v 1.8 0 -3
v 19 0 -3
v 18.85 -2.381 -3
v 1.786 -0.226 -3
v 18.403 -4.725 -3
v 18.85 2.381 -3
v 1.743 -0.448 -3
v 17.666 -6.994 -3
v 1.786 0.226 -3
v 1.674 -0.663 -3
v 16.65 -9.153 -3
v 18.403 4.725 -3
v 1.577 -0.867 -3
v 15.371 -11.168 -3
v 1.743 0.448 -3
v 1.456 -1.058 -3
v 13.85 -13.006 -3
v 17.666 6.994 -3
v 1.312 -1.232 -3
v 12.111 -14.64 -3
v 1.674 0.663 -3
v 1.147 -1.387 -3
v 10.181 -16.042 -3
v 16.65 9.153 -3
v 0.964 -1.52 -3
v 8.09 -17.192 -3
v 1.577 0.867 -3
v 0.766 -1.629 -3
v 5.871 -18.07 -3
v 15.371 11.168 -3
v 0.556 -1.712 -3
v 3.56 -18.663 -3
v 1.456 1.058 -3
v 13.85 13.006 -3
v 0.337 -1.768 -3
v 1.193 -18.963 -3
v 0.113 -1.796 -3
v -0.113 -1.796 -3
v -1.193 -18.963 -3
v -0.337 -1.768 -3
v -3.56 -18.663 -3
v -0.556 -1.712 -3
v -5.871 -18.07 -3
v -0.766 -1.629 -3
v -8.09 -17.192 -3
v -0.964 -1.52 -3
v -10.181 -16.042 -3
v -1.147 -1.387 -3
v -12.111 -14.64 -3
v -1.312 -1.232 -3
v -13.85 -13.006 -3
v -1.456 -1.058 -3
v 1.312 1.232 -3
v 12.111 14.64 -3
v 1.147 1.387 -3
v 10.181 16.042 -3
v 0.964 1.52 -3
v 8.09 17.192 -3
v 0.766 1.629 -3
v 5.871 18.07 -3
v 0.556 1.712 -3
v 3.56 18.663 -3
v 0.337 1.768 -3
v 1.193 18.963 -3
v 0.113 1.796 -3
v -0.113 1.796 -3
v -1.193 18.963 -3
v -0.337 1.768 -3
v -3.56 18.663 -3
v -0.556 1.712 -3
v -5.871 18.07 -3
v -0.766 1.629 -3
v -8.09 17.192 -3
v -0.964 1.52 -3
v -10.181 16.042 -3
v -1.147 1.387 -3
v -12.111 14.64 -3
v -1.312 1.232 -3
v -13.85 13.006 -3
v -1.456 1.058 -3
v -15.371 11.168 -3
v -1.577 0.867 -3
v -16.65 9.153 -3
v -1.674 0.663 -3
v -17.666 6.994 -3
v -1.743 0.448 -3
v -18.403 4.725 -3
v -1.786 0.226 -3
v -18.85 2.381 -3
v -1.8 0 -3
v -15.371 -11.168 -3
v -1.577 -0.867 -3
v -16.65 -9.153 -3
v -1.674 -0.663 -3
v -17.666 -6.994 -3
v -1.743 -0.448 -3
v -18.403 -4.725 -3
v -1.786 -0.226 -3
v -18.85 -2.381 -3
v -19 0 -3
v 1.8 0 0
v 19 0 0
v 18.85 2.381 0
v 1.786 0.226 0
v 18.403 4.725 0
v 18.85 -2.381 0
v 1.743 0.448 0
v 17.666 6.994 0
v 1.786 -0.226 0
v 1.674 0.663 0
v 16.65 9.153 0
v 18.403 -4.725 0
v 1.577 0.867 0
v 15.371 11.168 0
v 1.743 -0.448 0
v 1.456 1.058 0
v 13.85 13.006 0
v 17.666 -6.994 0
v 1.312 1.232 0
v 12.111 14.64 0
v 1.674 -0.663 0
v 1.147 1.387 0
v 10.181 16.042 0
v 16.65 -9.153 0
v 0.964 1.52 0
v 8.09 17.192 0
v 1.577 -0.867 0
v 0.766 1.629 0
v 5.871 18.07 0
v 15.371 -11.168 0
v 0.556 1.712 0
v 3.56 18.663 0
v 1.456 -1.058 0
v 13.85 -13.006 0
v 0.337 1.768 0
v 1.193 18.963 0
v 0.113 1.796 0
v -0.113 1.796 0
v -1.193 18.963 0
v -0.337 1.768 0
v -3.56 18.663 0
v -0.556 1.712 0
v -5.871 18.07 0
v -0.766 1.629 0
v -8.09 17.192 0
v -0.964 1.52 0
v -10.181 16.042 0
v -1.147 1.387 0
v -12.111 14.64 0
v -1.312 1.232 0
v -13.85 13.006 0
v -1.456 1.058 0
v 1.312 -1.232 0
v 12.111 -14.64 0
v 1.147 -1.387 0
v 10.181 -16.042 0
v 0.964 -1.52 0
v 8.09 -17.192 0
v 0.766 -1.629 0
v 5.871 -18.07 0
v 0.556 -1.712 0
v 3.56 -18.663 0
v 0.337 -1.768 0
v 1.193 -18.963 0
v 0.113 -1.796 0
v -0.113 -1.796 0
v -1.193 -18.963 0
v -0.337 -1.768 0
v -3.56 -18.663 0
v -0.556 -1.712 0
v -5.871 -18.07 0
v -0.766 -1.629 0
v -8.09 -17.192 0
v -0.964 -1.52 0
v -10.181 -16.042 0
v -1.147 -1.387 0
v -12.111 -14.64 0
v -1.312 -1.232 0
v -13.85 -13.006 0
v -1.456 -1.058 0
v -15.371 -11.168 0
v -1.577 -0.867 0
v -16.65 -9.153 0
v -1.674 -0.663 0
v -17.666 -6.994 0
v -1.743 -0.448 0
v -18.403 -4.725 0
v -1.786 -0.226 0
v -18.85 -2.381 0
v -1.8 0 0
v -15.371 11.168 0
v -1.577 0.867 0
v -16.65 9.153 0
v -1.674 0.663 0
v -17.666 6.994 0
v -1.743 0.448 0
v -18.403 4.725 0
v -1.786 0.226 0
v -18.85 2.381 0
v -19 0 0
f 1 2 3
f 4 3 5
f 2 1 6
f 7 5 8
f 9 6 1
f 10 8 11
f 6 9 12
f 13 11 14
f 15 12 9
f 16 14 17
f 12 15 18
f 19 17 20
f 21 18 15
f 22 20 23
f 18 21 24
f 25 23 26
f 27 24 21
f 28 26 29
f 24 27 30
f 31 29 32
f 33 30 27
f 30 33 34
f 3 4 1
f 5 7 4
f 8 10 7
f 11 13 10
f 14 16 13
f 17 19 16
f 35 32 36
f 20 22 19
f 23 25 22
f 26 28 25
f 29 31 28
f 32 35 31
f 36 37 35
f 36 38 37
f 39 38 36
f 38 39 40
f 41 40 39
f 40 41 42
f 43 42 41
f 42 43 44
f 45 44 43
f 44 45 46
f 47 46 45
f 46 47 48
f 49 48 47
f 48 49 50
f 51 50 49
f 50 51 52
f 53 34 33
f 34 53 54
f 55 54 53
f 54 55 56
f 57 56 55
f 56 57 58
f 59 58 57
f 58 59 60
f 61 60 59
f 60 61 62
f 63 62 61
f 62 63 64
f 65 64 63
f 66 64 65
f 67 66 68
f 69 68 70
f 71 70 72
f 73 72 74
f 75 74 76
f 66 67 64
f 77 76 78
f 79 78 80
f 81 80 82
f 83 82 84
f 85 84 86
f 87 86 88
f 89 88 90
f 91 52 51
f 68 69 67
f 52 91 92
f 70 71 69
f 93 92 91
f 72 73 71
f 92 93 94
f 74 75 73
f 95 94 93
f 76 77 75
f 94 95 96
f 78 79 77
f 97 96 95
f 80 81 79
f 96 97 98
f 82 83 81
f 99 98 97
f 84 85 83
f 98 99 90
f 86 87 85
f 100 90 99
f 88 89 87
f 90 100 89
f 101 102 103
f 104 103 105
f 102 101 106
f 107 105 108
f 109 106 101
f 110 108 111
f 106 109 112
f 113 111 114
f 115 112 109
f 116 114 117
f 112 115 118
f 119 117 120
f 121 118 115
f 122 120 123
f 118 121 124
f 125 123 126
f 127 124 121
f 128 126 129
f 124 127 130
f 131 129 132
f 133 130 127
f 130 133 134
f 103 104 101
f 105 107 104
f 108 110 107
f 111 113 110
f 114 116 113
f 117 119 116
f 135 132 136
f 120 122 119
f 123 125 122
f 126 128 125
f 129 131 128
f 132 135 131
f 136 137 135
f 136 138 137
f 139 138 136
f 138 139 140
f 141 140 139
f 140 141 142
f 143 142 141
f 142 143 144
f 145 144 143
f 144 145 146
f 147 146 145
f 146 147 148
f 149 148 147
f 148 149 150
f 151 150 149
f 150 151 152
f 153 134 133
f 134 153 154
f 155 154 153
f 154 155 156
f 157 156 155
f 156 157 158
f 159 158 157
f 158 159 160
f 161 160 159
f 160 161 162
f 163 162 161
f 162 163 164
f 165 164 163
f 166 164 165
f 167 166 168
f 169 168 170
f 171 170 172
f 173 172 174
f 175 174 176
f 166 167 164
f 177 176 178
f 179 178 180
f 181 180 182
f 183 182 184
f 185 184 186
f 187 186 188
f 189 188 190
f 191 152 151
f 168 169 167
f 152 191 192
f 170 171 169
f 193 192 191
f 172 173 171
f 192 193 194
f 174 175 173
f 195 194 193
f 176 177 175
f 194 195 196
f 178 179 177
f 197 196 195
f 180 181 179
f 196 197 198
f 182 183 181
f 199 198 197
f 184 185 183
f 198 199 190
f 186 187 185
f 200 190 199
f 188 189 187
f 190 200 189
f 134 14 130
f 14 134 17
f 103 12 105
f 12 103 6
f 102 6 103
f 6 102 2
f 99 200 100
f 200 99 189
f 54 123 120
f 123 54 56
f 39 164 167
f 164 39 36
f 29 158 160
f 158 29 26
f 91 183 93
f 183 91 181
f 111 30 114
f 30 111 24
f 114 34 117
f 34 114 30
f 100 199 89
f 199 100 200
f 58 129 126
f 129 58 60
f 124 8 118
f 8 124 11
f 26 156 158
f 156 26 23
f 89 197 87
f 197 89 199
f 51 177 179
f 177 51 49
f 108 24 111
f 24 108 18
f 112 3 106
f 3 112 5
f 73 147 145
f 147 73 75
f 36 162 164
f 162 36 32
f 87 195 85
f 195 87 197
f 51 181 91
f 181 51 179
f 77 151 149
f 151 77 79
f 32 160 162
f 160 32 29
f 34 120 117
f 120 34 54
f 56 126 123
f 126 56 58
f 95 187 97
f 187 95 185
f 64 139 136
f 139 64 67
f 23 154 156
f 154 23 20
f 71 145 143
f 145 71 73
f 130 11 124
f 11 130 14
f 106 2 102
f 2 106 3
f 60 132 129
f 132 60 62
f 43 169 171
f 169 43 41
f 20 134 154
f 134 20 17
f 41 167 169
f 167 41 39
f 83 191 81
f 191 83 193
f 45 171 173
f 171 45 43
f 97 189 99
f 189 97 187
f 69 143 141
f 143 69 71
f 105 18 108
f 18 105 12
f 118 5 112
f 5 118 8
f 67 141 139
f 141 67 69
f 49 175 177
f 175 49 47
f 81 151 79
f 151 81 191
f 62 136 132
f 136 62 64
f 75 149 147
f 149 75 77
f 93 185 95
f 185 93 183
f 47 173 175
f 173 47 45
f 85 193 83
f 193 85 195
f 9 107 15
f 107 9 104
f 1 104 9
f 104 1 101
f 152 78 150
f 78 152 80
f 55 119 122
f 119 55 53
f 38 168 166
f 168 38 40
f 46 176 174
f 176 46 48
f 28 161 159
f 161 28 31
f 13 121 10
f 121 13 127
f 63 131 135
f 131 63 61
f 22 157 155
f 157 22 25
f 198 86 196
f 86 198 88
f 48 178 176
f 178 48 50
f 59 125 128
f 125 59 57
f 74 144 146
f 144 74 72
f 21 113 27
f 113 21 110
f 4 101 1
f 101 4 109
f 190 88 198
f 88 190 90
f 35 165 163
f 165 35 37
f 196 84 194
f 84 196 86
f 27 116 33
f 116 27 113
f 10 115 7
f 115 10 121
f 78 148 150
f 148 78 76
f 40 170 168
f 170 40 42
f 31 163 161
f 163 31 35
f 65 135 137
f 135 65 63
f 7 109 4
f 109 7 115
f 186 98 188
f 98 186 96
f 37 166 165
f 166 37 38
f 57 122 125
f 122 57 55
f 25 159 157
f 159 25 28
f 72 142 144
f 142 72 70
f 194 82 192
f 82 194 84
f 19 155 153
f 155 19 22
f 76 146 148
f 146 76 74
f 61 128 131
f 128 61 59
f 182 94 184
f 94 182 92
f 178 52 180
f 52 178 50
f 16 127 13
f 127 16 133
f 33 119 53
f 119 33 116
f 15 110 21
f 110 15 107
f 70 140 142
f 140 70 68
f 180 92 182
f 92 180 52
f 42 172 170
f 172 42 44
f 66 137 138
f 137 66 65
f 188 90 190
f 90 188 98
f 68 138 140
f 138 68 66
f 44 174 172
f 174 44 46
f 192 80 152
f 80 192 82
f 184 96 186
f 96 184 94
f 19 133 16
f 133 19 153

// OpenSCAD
$fn = 50;


difference() {
	union() {
		translate(v = [0, 0, -3.0000000000]) {
			cylinder(h = 3, r = 10.0000000000);
		}
		translate(v = [0, 0, -3.0000000000]) {
			cylinder(h = 3, r = 19.0000000000);
		}
	}
	union() {
		#translate(v = [0, 0, -3]) {
			cylinder(h = 3, r = 1.8000000000);
		}
	}
}
